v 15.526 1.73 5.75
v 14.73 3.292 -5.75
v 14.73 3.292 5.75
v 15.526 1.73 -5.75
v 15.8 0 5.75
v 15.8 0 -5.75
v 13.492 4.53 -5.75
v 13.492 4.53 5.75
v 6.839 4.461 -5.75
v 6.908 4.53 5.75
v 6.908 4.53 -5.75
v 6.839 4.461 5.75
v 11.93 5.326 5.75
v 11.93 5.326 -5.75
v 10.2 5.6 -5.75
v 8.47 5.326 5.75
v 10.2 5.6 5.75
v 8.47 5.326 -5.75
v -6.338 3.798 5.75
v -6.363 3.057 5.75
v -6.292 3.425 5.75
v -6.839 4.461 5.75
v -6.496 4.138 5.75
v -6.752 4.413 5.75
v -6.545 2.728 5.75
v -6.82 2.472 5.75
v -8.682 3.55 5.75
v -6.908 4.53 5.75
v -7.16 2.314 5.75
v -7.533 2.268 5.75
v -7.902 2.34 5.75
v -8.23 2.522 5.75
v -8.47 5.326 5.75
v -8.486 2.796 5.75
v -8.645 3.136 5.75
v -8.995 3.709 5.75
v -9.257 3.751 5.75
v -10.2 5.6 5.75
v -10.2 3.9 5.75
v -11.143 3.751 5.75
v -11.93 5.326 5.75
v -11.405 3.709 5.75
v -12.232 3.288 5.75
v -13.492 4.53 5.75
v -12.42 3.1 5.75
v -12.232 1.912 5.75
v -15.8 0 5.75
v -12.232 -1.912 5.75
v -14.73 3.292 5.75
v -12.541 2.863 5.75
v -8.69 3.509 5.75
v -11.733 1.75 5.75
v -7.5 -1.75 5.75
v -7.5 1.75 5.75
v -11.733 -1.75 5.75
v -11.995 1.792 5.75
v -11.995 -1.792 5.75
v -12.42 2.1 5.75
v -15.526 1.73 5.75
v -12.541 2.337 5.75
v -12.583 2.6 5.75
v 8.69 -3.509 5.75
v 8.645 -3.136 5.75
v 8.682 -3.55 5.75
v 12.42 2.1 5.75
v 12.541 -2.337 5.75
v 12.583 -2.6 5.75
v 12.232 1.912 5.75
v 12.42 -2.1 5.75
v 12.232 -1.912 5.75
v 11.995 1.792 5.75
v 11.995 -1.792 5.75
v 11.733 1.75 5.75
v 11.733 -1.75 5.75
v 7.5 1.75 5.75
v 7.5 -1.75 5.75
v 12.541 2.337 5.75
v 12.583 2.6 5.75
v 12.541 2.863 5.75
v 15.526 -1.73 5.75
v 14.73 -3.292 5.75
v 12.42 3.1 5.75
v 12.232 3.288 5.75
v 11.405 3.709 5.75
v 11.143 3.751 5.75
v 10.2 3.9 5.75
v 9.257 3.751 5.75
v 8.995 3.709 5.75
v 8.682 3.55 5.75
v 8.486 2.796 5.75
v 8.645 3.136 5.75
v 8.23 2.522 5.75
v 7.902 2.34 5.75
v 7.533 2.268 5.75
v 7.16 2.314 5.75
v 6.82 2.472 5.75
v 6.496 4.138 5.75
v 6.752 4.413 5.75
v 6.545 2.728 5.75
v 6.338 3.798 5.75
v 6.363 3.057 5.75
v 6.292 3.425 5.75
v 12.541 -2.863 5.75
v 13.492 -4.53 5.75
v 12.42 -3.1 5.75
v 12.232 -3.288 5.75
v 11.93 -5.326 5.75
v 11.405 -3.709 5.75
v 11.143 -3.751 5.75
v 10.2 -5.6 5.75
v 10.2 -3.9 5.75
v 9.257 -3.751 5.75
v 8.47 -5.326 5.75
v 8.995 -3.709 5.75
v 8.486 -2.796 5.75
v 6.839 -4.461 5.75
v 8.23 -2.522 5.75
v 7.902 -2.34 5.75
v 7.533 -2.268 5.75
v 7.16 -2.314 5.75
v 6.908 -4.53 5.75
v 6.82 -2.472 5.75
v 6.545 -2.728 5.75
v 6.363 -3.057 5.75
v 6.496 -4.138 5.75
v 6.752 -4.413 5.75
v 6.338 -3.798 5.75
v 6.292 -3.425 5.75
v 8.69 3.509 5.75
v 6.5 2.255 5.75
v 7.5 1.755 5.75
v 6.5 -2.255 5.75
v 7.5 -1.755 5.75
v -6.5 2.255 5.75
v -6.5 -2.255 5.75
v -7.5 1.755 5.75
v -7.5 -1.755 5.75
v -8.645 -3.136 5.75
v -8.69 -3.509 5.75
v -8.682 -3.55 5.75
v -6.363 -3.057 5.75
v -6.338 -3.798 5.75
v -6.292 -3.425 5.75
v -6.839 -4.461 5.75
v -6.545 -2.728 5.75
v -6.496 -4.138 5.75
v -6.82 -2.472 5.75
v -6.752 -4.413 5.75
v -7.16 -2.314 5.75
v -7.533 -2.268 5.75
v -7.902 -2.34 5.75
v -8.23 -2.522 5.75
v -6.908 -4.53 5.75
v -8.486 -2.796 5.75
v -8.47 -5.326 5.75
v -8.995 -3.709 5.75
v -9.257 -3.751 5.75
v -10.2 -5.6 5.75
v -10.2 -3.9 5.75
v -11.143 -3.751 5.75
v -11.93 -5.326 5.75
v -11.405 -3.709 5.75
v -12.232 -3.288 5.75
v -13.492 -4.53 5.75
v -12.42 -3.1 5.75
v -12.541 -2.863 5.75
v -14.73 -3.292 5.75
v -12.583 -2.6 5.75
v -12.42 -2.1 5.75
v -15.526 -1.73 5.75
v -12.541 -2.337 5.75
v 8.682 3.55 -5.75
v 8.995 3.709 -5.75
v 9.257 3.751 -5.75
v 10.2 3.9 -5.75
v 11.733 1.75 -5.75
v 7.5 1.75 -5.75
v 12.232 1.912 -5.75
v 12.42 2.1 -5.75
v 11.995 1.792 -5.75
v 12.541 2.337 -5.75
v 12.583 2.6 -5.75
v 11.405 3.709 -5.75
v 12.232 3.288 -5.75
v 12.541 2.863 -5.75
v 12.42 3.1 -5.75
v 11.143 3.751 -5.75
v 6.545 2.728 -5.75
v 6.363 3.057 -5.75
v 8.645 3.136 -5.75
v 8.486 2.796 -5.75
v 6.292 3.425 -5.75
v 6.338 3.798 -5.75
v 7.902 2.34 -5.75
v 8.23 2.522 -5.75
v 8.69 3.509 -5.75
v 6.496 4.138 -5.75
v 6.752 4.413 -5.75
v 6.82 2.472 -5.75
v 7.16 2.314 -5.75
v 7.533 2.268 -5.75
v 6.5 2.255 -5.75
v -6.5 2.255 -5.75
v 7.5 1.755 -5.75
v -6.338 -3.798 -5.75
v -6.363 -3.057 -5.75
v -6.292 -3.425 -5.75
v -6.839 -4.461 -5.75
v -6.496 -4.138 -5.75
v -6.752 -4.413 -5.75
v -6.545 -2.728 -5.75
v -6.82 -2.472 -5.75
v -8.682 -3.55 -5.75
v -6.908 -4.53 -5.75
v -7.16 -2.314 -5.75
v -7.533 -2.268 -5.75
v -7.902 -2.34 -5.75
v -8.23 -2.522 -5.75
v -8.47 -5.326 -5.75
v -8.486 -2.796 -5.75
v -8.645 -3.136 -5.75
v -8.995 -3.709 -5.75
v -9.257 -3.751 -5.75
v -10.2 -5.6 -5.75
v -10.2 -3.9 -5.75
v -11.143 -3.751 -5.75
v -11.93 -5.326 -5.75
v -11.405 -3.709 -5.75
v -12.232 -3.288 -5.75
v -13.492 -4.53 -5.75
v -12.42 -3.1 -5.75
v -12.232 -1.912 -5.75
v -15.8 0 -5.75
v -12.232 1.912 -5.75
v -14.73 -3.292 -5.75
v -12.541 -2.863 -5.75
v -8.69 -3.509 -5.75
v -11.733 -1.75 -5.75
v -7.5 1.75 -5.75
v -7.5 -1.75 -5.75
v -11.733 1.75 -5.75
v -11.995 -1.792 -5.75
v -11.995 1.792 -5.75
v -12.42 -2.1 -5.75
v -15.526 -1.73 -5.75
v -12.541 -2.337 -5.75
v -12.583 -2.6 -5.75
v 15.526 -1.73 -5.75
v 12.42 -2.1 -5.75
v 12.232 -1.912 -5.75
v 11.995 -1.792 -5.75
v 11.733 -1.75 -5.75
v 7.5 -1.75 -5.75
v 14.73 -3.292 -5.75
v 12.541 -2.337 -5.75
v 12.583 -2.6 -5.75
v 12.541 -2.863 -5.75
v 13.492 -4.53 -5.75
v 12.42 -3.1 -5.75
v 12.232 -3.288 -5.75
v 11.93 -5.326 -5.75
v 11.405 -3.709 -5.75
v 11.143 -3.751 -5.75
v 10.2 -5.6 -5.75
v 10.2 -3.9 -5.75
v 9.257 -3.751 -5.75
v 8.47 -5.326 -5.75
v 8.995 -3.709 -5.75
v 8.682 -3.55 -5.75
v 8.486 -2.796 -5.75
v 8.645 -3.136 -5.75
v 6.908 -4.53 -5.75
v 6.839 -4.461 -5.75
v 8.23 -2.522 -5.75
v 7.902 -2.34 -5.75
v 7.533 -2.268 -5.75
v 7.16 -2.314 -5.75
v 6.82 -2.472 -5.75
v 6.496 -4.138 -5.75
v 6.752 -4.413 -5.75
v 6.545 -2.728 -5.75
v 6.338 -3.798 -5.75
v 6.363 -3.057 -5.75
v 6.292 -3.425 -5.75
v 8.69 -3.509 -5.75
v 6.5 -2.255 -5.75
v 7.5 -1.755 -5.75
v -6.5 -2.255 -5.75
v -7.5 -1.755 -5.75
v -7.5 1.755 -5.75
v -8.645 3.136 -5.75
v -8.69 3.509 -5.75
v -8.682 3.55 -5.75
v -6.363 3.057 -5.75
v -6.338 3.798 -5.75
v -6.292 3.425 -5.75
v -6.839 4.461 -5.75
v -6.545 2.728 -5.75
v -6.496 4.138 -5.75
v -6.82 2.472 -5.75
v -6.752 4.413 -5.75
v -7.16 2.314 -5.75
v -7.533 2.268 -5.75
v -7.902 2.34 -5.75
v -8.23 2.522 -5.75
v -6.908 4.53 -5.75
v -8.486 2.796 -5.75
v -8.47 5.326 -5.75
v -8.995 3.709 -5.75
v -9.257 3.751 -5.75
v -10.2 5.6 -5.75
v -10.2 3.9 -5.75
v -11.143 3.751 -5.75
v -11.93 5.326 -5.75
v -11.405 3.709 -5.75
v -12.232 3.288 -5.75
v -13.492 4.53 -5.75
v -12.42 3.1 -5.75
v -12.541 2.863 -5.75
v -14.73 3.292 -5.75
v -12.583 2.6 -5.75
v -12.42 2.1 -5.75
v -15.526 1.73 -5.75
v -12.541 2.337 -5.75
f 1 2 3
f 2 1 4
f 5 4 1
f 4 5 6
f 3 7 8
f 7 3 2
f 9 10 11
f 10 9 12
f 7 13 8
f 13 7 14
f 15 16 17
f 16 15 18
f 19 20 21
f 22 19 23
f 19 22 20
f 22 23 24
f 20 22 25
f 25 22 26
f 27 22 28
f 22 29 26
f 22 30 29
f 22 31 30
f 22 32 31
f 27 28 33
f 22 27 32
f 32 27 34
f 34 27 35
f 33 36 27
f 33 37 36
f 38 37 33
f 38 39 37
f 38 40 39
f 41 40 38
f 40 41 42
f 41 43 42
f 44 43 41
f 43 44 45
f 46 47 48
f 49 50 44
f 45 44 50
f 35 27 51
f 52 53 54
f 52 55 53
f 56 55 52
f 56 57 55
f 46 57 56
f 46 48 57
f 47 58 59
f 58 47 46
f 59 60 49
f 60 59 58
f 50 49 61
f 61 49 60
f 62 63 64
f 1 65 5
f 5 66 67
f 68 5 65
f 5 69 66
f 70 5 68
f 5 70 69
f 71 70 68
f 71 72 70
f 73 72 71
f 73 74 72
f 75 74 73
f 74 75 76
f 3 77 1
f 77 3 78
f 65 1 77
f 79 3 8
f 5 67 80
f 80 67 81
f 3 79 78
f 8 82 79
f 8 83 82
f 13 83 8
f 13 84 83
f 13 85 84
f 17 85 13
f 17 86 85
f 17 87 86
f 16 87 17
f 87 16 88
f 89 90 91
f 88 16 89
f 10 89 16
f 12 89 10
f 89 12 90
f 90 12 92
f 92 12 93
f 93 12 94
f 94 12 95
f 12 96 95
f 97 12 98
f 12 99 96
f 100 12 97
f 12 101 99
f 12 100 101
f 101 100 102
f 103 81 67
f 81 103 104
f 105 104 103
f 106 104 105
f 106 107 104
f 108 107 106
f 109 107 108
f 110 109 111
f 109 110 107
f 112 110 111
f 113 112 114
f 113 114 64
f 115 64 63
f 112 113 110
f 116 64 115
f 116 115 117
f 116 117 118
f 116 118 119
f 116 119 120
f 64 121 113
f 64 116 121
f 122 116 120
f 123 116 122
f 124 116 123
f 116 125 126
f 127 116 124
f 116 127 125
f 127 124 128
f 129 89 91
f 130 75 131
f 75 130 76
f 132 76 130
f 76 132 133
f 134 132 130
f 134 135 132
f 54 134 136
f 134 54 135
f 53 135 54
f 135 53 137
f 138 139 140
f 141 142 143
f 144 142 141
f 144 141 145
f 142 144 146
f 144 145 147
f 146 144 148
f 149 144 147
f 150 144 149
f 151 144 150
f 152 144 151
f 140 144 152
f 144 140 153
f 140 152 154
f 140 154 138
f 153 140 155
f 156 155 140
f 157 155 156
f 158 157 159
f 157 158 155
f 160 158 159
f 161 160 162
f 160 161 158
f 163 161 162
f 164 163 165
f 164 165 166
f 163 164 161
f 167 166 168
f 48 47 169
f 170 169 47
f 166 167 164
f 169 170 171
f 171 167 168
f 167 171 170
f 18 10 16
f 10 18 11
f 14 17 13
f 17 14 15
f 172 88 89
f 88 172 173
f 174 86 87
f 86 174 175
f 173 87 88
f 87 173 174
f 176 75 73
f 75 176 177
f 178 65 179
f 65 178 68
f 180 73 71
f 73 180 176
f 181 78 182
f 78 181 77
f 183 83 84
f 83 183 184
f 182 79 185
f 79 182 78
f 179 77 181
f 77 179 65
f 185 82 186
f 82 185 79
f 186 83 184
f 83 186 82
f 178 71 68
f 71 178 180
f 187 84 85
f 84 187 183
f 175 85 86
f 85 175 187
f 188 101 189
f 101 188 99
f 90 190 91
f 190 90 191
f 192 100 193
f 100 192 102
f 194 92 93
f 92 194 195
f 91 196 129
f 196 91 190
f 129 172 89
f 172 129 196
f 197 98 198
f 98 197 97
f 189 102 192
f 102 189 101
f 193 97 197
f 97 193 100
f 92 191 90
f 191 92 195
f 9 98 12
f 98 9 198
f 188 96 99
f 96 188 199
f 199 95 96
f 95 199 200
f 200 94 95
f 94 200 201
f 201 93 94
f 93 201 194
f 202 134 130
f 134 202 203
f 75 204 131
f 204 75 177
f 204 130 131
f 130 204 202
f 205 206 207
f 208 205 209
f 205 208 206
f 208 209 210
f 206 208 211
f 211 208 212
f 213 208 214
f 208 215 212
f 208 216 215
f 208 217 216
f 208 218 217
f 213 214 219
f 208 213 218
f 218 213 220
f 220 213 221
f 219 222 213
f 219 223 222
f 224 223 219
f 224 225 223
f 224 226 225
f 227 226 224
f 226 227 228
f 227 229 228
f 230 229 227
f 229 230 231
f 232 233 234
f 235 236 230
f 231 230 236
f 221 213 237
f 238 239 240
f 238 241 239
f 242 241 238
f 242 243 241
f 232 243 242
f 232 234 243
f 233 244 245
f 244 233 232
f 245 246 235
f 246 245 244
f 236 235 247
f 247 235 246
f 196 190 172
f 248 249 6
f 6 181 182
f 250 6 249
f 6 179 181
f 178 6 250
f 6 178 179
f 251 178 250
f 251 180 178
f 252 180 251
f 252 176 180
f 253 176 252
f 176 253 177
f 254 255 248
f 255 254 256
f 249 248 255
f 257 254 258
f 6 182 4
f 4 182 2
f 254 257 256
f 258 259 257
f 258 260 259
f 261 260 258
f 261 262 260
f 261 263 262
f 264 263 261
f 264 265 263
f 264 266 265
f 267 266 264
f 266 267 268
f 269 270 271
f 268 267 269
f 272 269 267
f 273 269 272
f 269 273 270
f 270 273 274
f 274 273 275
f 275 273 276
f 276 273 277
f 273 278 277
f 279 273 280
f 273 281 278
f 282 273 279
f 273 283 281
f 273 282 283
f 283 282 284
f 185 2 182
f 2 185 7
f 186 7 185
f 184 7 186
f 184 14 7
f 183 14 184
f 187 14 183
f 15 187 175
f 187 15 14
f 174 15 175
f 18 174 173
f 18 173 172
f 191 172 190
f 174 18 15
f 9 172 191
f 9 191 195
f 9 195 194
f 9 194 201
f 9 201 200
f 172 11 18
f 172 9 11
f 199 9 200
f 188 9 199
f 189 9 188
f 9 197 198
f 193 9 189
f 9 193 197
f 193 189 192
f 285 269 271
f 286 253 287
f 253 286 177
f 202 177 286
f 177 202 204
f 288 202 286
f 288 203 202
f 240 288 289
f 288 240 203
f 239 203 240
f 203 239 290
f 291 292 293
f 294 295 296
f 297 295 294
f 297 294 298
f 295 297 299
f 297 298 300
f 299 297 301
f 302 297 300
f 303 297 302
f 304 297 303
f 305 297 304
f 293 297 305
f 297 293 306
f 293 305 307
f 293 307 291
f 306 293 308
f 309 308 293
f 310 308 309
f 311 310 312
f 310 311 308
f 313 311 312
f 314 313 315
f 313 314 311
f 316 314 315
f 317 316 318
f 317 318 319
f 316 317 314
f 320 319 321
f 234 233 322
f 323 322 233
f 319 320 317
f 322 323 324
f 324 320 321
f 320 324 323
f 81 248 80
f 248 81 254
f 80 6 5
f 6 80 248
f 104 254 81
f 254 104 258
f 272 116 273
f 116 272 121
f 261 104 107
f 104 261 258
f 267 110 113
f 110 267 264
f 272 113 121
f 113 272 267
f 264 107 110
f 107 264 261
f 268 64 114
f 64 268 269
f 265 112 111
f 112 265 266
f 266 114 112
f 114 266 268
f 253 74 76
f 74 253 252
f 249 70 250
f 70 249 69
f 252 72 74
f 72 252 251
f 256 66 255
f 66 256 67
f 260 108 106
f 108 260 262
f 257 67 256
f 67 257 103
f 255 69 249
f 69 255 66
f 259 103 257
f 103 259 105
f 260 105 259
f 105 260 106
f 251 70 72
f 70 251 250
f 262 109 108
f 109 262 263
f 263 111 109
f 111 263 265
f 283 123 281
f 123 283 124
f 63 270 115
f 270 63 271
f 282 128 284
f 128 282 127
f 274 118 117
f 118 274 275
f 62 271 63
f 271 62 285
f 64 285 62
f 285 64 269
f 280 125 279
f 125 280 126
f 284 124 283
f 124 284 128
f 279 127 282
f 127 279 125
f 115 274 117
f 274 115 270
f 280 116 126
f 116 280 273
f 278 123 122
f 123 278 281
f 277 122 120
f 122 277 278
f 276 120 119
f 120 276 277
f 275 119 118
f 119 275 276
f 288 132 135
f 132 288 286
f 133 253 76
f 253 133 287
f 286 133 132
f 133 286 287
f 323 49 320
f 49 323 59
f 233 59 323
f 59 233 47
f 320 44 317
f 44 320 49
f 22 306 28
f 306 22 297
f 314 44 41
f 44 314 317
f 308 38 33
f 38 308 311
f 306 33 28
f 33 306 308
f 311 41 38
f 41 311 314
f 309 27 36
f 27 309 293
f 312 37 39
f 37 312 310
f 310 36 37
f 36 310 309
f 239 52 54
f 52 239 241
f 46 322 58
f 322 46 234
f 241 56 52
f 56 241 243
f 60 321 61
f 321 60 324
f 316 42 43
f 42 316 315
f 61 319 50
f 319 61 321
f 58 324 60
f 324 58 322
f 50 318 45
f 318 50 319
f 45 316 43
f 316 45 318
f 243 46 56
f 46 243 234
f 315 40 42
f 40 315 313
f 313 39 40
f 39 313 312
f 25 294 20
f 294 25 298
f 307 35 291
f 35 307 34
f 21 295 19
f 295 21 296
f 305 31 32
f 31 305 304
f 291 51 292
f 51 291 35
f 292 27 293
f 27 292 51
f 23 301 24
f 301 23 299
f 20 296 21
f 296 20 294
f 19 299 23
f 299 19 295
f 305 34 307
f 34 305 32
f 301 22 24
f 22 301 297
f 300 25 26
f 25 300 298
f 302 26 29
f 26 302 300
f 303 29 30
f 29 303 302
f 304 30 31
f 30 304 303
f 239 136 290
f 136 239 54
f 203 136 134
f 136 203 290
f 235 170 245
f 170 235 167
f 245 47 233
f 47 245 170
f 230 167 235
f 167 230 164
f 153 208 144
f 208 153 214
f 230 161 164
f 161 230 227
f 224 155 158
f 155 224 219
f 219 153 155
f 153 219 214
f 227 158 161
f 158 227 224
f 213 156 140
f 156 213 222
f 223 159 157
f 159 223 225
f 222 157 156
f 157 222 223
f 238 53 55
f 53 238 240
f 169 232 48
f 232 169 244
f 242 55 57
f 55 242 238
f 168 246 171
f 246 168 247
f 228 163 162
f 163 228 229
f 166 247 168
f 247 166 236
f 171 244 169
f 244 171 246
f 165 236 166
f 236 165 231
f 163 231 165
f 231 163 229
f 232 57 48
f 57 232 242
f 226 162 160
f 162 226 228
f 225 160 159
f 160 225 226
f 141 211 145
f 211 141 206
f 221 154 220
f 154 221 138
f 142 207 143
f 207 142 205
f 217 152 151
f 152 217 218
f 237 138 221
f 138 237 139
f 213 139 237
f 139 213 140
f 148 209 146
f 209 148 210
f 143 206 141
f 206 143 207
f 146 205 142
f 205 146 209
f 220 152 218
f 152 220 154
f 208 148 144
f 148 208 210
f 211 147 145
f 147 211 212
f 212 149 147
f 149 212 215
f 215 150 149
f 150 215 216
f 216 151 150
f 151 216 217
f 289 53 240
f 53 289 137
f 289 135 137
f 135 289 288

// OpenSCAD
WIDTH=40.7;
HEIGHT=12.4;
LENGTH=205;
BEVEL=1;
TRACK_WIDTH=6.2;
TRACK_HEIGHT=3;
TRACK_DIST=20;
TRACK_CHAMFER = 2;

BRIDGE_HEIGHT=64;
BRIDGE_R1=214;
BRIDGE_R2=220;

CONN_WIDTH=7.3;
CONN_R=6.5;
CONN_BEVEL=1.7;
CONN_DEPTH=16;

ROUND_R=189;

SUPPORT_SIDE=7.2;
SUPPORT_THICK=33;
SUPPORT_WIDTH=WIDTH+1+2*SUPPORT_SIDE;

TUNNEL_R=28.5;
TUNNEL_H=65;
TUNNEL_LEN=135;
TUNNEL_THICK=2.1;
TUNNEL_SIDE_W=4.3;

CONN_LEN=31.6;
CONN_HEIGHT=11.5;

CONN_MALE_R=6;
CONN_MALE_W=6.5;
CONN_MALE_HOLE_Y=6.8;
CONN_MALE_HOLE_Z=6.4;
CONN_MALE_RIM=1;
CONN_MALE_PROTRUDE=0.75;
CONN_MALE_PROTRUDE_R=1.5;

CONN_FEMALE_R=5.6;
CONN_FEMALE_PROTRUDE_R=1.2;
CONN_FEMALE_THICK=1.6;
CONN_FEMALE_BRIDGE_L=6.5;
CONN_FEMALE_BRIDGE_W1=3.5;
CONN_FEMALE_BRIDGE_W2=4.5;
CONN_FEMALE_BRIDGE_RIM=CONN_FEMALE_BRIDGE_W2-CONN_FEMALE_BRIDGE_W1;
CONN_FEMALE_THICK=1.7;

module track_single() {
     //square([TRACK_WIDTH,TRACK_HEIGHT]);
     polygon(points=[[0,0],[TRACK_WIDTH,0],[TRACK_WIDTH+TRACK_CHAMFER,TRACK_HEIGHT],[0,TRACK_HEIGHT]]);
}

module track() {
    translate([WIDTH/2-TRACK_WIDTH-TRACK_DIST/2,HEIGHT-TRACK_HEIGHT,0])
	 track_single();

//translate([WIDTH/2-TRACK_WIDTH-TRACK_DIST/2,HEIGHT-TRACK_HEIGHT,0])
    #mirror([1,0,0]) translate([-WIDTH/2-TRACK_WIDTH-TRACK_DIST/2,HEIGHT-TRACK_HEIGHT,0])
	 track_single();
    
    /* translate([WIDTH/2+TRACK_DIST/2,HEIGHT-TRACK_HEIGHT,0]) */
    /*     track_single(); */
}

module body() {
     difference() {
        polygon(points=[[BEVEL,0],[WIDTH-BEVEL,0],[WIDTH,BEVEL],[WIDTH,HEIGHT-BEVEL],[WIDTH-BEVEL,HEIGHT],[BEVEL,HEIGHT],[0,HEIGHT-BEVEL],[0,BEVEL]]);
        translate([0,0,0.01])
            track();
    }
}

module brio_curved(r, parts) {
    translate([0,-r,0])
    difference() {
        rotate([0,0,-360/parts])
        difference() {
            rotate_extrude(convexity = 10, $fn=200)
            translate([r, 0, 0])
            difference() {
                body();
                translate([0,-HEIGHT+TRACK_HEIGHT,0])
                track();
            }
            translate([0,-500,-500])
            cube([1000,1000,1000]);
            translate([0,r+WIDTH/2,5*HEIGHT])
            mirror([1,0,0])
            rotate([90,0,0])
            connector();
        }

        translate([0,r+WIDTH/2,5*HEIGHT])
        rotate([90,0,0])
        connector();
        translate([-1000,-500,-500])
        cube([1000,1000,1000]);
    }
}

module round_quart() {
    intersection() {
        translate([0,0,WIDTH])
        rotate_extrude(convexity = 10, $fn = 200)
            translate([BRIDGE_R1, 0, 0])
            rotate([0,0,-90])
translate([0,-HEIGHT,0])
                body();

        cube([1000,1000,1000]);
    }
}

module round_quart_2() {
    intersection() {
        translate([0,0,WIDTH])
        rotate_extrude(convexity = 10, $fn = 200)
            translate([BRIDGE_R2, 0, 0])
            rotate([0,0,-90])
                mirror([0,1,0])
translate([0,-HEIGHT,0])
                body();

            cube([1000,1000,1000]);
    }
}


module curved_track() {
    intersection() {
        translate([0,-BRIDGE_R1+BRIDGE_HEIGHT,0])
        round_quart();
        cube([LENGTH/2,BRIDGE_HEIGHT,WIDTH]);
    }

    intersection() {
        translate([LENGTH,BRIDGE_R2+HEIGHT,0])
        mirror([1,1,0])
        round_quart_2();
        translate([LENGTH/2,0,0])
        cube([LENGTH/2,BRIDGE_HEIGHT,WIDTH]);
    } 
}

module bridge_hole_part(t, w,h,w2,h2) {
    hull() {
        cylinder(0.01,r=w/2);
        translate([0,0,t])
            cylinder(0.01,r=w2/2);
    }  
    hull() {
        translate([-w/2,0,0])
            cube([w,h-w/2,0.01]);
        translate([-w2/2,0,t])
            cube([w2,h2-w2/2,0.01]);
    } 
}

module bridge_hole(w,h) {
    mirror([0,1,0])
    translate([0,-h+w/2+0.01,BEVEL]) {
        bridge_hole_part(WIDTH-2*BEVEL,w,h,w,h);
        translate([0,0,-BEVEL])
            bridge_hole_part(BEVEL,w+BEVEL,h+BEVEL,w,h);
        translate([0,0,WIDTH-2*BEVEL])
            bridge_hole_part(BEVEL,w,h,w+BEVEL,h+BEVEL); 
    }
}

module bridge_body() {
    curved_track();
    intersection() {
    translate([0,-BRIDGE_R2+BRIDGE_HEIGHT-HEIGHT/2,0])
    cylinder(WIDTH,r=BRIDGE_R2, $fn=200);
    translate([0,BEVEL,0])
    cube([LENGTH,BRIDGE_HEIGHT,WIDTH]);
    }
    translate([0,BEVEL,0])
    cube([LENGTH,HEIGHT-TRACK_HEIGHT-BEVEL,WIDTH]);
    translate([130,BEVEL,0])
    cube([25,HEIGHT,WIDTH]);
    hull() {
        translate([0,0,BEVEL])
        cube([LENGTH,0.01,WIDTH-2*BEVEL]);
        translate([0,BEVEL,0])
        cube([LENGTH,0.01,WIDTH]);
    }
}

module brio_bridge() {
    rotate([90,0,-90])
    difference() {
        bridge_body();
        translate([84,0,0])
        bridge_hole(44.5,30);
        bridge_hole(68,BRIDGE_HEIGHT-HEIGHT);
        translate([-0.01,9*HEIGHT,WIDTH/2])
        connector();
        translate([LENGTH+0.01,9*HEIGHT,WIDTH/2])
        mirror([1,0,0])
        connector();
    }
}

module conn_bevel() {
    translate([WIDTH/2-BEVEL,0,0])
    linear_extrude(height=10*HEIGHT)
        polygon(points=[[0,-0.01],[BEVEL+0.01,BEVEL],[BEVEL+0.01,-0.01]]);
}
module connector() {
    rotate([90,90,0])
    {
    hull() {
        translate([-(CONN_WIDTH+2*CONN_BEVEL)/2,-0.01,0])
            cube([CONN_WIDTH+2*CONN_BEVEL, 0.01, 10*HEIGHT]);
        translate([-CONN_WIDTH/2,CONN_BEVEL,0])
            cube([CONN_WIDTH, 0.01, 10*HEIGHT]);
    }
    translate([-CONN_WIDTH/2,0,0])
        cube([CONN_WIDTH, CONN_DEPTH, 10*HEIGHT]);

    difference() {
        translate([0,CONN_DEPTH-CONN_R+1.1,0])
            cylinder(10*HEIGHT,r=CONN_R);
        translate([-CONN_WIDTH/2,CONN_DEPTH,0])
            cube([CONN_WIDTH, CONN_DEPTH, 10*HEIGHT]);
    }

    conn_bevel();
    mirror([1,0,0])
        conn_bevel();

    } 
}

module brio_straight(len) {
    rotate([90,0,0])
    difference() {
        linear_extrude(height=len)
            body();
        translate([WIDTH/2,5*HEIGHT,len])
        rotate([0,90,0])
            connector();
        mirror([0,0,1])
        translate([WIDTH/2,5*HEIGHT,0])
        rotate([0,90,0])
            connector();
    }
}

module brio_cross(len) {
    difference() {
        union() {
            translate([-WIDTH/2,len/2,0])
                brio_straight(len);
            rotate([0,0,90])
                translate([-WIDTH/2,len/2,0])
                    brio_straight(len);
        }
        translate([-len,-WIDTH/2,0.01])
            rotate([90,0,90])
                linear_extrude(height=len*2)
                    track();
        translate([-WIDTH/2,len,0.01]) 
            rotate([90,0,0])
                linear_extrude(height=len*2)
                    track();
    }
}

module brick_6_track() {
    translate([0,-0.01,0])
    rotate([90,0,0])
    linear_extrude(height=LENGTH+0.02)
        track();
    translate([-ROUND_R,0,0])
    rotate_extrude(convexity = 10, $fn = 200)
    translate([ROUND_R, 0, 0])
        track();
}

module brio_splitter() {
    difference() {
        union() {
            brio_straight((3/4)*LENGTH);
            rotate([0,0,-90])
            brio_curved(ROUND_R, 8);
        }
        translate([0,0,0.01])
        brick_6_track();
        translate([0,0,-HEIGHT+TRACK_HEIGHT-0.01])
        brick_6_track();
    }

}

module brick_6_track_round() {
    cube([1,1,1]);

    translate([-ROUND_R,0,0])
    rotate_extrude(convexity = 10, $fn = 200)
    translate([ROUND_R, 0, 0])
        track();

    translate([WIDTH,0,0])
    mirror([1,0,0])
    translate([-ROUND_R,0,0])
    rotate_extrude(convexity = 10, $fn = 200)
    translate([ROUND_R, 0, 0])
        track();
}

module brio_splitter_round() {
    difference() {
        union() {
//            brio_straight((3/4)*LENGTH);
 //           rotate([0,0,-90])
//            brio_curved(ROUND_R, 8*3/2);
            rotate([0,0,-90])
            brio_curved(ROUND_R, 8*3/2);
            translate([WIDTH,0,0])
            mirror([1,0,0])
            rotate([0,0,-90])
            brio_curved(ROUND_R, 8*3/2);
        }
        translate([0,0,0.01])
        brick_6_track_round();
        translate([0,0,-HEIGHT+TRACK_HEIGHT-0.01])
        brick_6_track_round();
    }

}
module support_halve() {
    linear_extrude(height=SUPPORT_THICK)
        polygon(points=[[0,HEIGHT-BEVEL],[WIDTH/2+0.5,HEIGHT-BEVEL],[WIDTH/2+0.5,BEVEL],[WIDTH/2+0.5+BEVEL,0],[SUPPORT_WIDTH/2-BEVEL,0],[SUPPORT_WIDTH/2,BEVEL],[SUPPORT_WIDTH/2,BRIDGE_HEIGHT-HEIGHT-BEVEL],[SUPPORT_WIDTH/2-BEVEL,BRIDGE_HEIGHT-HEIGHT],[WIDTH/2,BRIDGE_HEIGHT-HEIGHT],[WIDTH/2,BRIDGE_HEIGHT-2*BEVEL],[WIDTH/2-BEVEL,BRIDGE_HEIGHT-BEVEL],[0,BRIDGE_HEIGHT-BEVEL]]);
}

module brio_support() {
    translate([0,-BRIDGE_HEIGHT-BEVEL,0]) {
        support_halve();
        mirror([1,0,0])
            support_halve();
    }
}

module tunnel_shape(sub) {
    translate([TUNNEL_H-TUNNEL_R,0,0])
        circle(TUNNEL_R-sub, $fn=200);
    translate([0,-TUNNEL_R+sub,0])
        square([TUNNEL_H-TUNNEL_R,TUNNEL_R*2-2*sub]);
}

module tunnel_halve_neg() {
    translate([0,0,0])
        linear_extrude(height=TUNNEL_THICK)
            tunnel_shape(2*TUNNEL_THICK);
    hull() {
        translate([0,0,TUNNEL_THICK])
            linear_extrude(height=0.01)
                tunnel_shape(2*TUNNEL_THICK);
        translate([0,0,2*TUNNEL_THICK])
            linear_extrude(height=0.01)
                tunnel_shape(TUNNEL_THICK);
    }
    translate([0,0,2*TUNNEL_THICK])
        linear_extrude(height=TUNNEL_LEN/2-2*TUNNEL_THICK+0.01)
            tunnel_shape(TUNNEL_THICK);
}

module tunnel_halve_pos() {
    linear_extrude(height=TUNNEL_LEN/2)
        tunnel_shape(0);
}

module tunnel_halve() {
    translate([0,0,-TUNNEL_LEN/2]) {
        difference() {
            tunnel_halve_pos();
            tunnel_halve_neg();
        }
        translate([0,TUNNEL_R-TUNNEL_THICK,0])
            linear_extrude(height=TUNNEL_LEN/2)
                square([TUNNEL_THICK, TUNNEL_SIDE_W]);
        translate([0,-TUNNEL_R+TUNNEL_THICK-TUNNEL_SIDE_W,0])
            linear_extrude(height=TUNNEL_LEN/2)
                square([TUNNEL_THICK, TUNNEL_SIDE_W]);
    }
}

module brio_tunnel() {
    translate([0,-TUNNEL_LEN/2,0])
    mirror([0,0,1])
    rotate([90,90,0]) {
        tunnel_halve();
        mirror([0,0,1])
            tunnel_halve();
    }
}

module connector_male_protrude() {
    translate([0,CONN_MALE_R-CONN_MALE_PROTRUDE_R+CONN_MALE_PROTRUDE,0])
        cylinder((CONN_HEIGHT-2*CONN_MALE_RIM)/2,r=CONN_MALE_PROTRUDE_R,$fn=20);
}

module connector_male_end(len) {
    difference() {
        intersection() {
            translate([0,50,0])
                cube([100,100,100],center=true);
            union() {
                translate([0,0,CONN_HEIGHT/2-CONN_MALE_RIM])
                    hull() {
                        cylinder(0.01, r=CONN_MALE_R, $fn=20);
                        translate([0,0,CONN_MALE_RIM])
                            cylinder(0.01, r=CONN_MALE_R-CONN_MALE_RIM, $fn=20);
                    }
                cylinder(CONN_HEIGHT/2-CONN_MALE_RIM, r=CONN_MALE_R, $fn=20);
                rotate([0,0,40])
                    connector_male_protrude();
                rotate([0,0,-40])
                    connector_male_protrude();
            }
        }
        translate([-CONN_MALE_R/2,0,0])
            cube([CONN_MALE_R,CONN_MALE_HOLE_Y,CONN_MALE_HOLE_Z],center=true);
    }
}

module connector_male_bridge(len) {
    hull() {
        cube([len-CONN_MALE_R,0.01,CONN_HEIGHT/2], center=true);
        translate([0,CONN_MALE_RIM,-CONN_MALE_RIM/2])
            cube([len-CONN_MALE_R-2*CONN_MALE_RIM,0.01,CONN_HEIGHT/2-CONN_MALE_RIM], center=true);
    }
    translate([0,-(CONN_MALE_W-2*CONN_MALE_RIM)/4,0])
        cube([len-CONN_MALE_R,(CONN_MALE_W-2*CONN_MALE_RIM)/2,CONN_HEIGHT/2], center=true);
}

module connector_male_quart(len) {
    connector_male_end(len);
    translate([(len-CONN_MALE_R)/2,CONN_MALE_W/2-CONN_MALE_RIM,CONN_HEIGHT/4])
        connector_male_bridge(len);
}

module connector_male(len) {
    translate([-len+CONN_MALE_R,0,0]) {
        connector_male_quart(len);
        mirror([0,0,1])
            connector_male_quart(len);
        mirror([0,1,0]) {
            connector_male_quart(len);
            mirror([0,0,1])
                connector_male_quart(len);
        }
    }
}

module connector_female_end(len) {
    difference() {
        intersection() {
            translate([0,50,0])
                cube([100,100,100],center=true);
            difference() {
                cylinder(CONN_HEIGHT/2, r=CONN_FEMALE_R, $fn=20);
                rotate([0,0,38])
                    translate([-CONN_FEMALE_R/2,CONN_FEMALE_R,0])
                        cube([CONN_FEMALE_R,CONN_FEMALE_R*2,CONN_HEIGHT], center=true);
                minkowski() {
                    intersection() {
                        translate([0,50+CONN_FEMALE_BRIDGE_W1/2+CONN_FEMALE_THICK/2,0])
                            cube([100,100,100],center=true);
                        cylinder(CONN_HEIGHT/2,r=CONN_FEMALE_R-3*CONN_FEMALE_THICK/2,$fn=20);
                    }
                    cylinder(CONN_FEMALE_THICK,r=CONN_FEMALE_THICK/2,$fn=20);
                }
            }
        }
    }
    rotate([0,0,38])
        translate([0,CONN_FEMALE_R-CONN_FEMALE_PROTRUDE_R,0])
            cylinder(CONN_HEIGHT/2,r=CONN_FEMALE_PROTRUDE_R, $fn=20);

}

module connector_female_bridge(len) {
    translate([0,0,CONN_HEIGHT/4]) {
        translate([(len-CONN_FEMALE_THICK/2)/2,CONN_FEMALE_BRIDGE_W1/4,0])
            cube([len-CONN_FEMALE_THICK/2,CONN_FEMALE_BRIDGE_W1/2,CONN_HEIGHT/2],center=true);
        hull() {
            translate([(CONN_FEMALE_BRIDGE_L+CONN_FEMALE_BRIDGE_RIM)/2,CONN_FEMALE_BRIDGE_W1/2,0])
                cube([CONN_FEMALE_BRIDGE_L+CONN_FEMALE_BRIDGE_RIM,0.01,CONN_HEIGHT/2],center=true);
            translate([CONN_FEMALE_BRIDGE_L/2,CONN_FEMALE_BRIDGE_W2/2,0])
                cube([CONN_FEMALE_BRIDGE_L,0.01,CONN_HEIGHT/2],center=true);
        }
    }

}

module connector_female_quart(len) {
    translate([len-CONN_FEMALE_R,0,0])
        connector_female_end(len);
    connector_female_bridge(len);
}

module connector_female(len) {
        connector_female_quart(len);
        mirror([0,0,1])
            connector_female_quart(len);
        mirror([0,1,0]) {
            connector_female_quart(len);
            mirror([0,0,1])
                connector_female_quart(len);
        }
}

module brio_connector(len) {
    connector_male(len/2);
    connector_female(len/2);
}
module brio_connector_soft(len) {
     connector_female(len/2);
     mirror([1,0,0]) connector_female(len/2);
}

//brio_straight(LENGTH);
//brio_straight((3/4)*LENGTH);
//brio_straight((1/2)*LENGTH);
//brio_straight((1/4)*LENGTH);
//brio_curved(ROUND_R, 8); // inner radius, Nth part
//brio_curved(ROUND_R, 16); // inner radius, Nth part
//brio_bridge();
//brio_cross(LENGTH/2);
//brio_splitter();
//brio_splitter_round();
//brio_support();
//brio_tunnel();
//brio_connector(CONN_LEN);
brio_connector_soft(CONN_LEN);
